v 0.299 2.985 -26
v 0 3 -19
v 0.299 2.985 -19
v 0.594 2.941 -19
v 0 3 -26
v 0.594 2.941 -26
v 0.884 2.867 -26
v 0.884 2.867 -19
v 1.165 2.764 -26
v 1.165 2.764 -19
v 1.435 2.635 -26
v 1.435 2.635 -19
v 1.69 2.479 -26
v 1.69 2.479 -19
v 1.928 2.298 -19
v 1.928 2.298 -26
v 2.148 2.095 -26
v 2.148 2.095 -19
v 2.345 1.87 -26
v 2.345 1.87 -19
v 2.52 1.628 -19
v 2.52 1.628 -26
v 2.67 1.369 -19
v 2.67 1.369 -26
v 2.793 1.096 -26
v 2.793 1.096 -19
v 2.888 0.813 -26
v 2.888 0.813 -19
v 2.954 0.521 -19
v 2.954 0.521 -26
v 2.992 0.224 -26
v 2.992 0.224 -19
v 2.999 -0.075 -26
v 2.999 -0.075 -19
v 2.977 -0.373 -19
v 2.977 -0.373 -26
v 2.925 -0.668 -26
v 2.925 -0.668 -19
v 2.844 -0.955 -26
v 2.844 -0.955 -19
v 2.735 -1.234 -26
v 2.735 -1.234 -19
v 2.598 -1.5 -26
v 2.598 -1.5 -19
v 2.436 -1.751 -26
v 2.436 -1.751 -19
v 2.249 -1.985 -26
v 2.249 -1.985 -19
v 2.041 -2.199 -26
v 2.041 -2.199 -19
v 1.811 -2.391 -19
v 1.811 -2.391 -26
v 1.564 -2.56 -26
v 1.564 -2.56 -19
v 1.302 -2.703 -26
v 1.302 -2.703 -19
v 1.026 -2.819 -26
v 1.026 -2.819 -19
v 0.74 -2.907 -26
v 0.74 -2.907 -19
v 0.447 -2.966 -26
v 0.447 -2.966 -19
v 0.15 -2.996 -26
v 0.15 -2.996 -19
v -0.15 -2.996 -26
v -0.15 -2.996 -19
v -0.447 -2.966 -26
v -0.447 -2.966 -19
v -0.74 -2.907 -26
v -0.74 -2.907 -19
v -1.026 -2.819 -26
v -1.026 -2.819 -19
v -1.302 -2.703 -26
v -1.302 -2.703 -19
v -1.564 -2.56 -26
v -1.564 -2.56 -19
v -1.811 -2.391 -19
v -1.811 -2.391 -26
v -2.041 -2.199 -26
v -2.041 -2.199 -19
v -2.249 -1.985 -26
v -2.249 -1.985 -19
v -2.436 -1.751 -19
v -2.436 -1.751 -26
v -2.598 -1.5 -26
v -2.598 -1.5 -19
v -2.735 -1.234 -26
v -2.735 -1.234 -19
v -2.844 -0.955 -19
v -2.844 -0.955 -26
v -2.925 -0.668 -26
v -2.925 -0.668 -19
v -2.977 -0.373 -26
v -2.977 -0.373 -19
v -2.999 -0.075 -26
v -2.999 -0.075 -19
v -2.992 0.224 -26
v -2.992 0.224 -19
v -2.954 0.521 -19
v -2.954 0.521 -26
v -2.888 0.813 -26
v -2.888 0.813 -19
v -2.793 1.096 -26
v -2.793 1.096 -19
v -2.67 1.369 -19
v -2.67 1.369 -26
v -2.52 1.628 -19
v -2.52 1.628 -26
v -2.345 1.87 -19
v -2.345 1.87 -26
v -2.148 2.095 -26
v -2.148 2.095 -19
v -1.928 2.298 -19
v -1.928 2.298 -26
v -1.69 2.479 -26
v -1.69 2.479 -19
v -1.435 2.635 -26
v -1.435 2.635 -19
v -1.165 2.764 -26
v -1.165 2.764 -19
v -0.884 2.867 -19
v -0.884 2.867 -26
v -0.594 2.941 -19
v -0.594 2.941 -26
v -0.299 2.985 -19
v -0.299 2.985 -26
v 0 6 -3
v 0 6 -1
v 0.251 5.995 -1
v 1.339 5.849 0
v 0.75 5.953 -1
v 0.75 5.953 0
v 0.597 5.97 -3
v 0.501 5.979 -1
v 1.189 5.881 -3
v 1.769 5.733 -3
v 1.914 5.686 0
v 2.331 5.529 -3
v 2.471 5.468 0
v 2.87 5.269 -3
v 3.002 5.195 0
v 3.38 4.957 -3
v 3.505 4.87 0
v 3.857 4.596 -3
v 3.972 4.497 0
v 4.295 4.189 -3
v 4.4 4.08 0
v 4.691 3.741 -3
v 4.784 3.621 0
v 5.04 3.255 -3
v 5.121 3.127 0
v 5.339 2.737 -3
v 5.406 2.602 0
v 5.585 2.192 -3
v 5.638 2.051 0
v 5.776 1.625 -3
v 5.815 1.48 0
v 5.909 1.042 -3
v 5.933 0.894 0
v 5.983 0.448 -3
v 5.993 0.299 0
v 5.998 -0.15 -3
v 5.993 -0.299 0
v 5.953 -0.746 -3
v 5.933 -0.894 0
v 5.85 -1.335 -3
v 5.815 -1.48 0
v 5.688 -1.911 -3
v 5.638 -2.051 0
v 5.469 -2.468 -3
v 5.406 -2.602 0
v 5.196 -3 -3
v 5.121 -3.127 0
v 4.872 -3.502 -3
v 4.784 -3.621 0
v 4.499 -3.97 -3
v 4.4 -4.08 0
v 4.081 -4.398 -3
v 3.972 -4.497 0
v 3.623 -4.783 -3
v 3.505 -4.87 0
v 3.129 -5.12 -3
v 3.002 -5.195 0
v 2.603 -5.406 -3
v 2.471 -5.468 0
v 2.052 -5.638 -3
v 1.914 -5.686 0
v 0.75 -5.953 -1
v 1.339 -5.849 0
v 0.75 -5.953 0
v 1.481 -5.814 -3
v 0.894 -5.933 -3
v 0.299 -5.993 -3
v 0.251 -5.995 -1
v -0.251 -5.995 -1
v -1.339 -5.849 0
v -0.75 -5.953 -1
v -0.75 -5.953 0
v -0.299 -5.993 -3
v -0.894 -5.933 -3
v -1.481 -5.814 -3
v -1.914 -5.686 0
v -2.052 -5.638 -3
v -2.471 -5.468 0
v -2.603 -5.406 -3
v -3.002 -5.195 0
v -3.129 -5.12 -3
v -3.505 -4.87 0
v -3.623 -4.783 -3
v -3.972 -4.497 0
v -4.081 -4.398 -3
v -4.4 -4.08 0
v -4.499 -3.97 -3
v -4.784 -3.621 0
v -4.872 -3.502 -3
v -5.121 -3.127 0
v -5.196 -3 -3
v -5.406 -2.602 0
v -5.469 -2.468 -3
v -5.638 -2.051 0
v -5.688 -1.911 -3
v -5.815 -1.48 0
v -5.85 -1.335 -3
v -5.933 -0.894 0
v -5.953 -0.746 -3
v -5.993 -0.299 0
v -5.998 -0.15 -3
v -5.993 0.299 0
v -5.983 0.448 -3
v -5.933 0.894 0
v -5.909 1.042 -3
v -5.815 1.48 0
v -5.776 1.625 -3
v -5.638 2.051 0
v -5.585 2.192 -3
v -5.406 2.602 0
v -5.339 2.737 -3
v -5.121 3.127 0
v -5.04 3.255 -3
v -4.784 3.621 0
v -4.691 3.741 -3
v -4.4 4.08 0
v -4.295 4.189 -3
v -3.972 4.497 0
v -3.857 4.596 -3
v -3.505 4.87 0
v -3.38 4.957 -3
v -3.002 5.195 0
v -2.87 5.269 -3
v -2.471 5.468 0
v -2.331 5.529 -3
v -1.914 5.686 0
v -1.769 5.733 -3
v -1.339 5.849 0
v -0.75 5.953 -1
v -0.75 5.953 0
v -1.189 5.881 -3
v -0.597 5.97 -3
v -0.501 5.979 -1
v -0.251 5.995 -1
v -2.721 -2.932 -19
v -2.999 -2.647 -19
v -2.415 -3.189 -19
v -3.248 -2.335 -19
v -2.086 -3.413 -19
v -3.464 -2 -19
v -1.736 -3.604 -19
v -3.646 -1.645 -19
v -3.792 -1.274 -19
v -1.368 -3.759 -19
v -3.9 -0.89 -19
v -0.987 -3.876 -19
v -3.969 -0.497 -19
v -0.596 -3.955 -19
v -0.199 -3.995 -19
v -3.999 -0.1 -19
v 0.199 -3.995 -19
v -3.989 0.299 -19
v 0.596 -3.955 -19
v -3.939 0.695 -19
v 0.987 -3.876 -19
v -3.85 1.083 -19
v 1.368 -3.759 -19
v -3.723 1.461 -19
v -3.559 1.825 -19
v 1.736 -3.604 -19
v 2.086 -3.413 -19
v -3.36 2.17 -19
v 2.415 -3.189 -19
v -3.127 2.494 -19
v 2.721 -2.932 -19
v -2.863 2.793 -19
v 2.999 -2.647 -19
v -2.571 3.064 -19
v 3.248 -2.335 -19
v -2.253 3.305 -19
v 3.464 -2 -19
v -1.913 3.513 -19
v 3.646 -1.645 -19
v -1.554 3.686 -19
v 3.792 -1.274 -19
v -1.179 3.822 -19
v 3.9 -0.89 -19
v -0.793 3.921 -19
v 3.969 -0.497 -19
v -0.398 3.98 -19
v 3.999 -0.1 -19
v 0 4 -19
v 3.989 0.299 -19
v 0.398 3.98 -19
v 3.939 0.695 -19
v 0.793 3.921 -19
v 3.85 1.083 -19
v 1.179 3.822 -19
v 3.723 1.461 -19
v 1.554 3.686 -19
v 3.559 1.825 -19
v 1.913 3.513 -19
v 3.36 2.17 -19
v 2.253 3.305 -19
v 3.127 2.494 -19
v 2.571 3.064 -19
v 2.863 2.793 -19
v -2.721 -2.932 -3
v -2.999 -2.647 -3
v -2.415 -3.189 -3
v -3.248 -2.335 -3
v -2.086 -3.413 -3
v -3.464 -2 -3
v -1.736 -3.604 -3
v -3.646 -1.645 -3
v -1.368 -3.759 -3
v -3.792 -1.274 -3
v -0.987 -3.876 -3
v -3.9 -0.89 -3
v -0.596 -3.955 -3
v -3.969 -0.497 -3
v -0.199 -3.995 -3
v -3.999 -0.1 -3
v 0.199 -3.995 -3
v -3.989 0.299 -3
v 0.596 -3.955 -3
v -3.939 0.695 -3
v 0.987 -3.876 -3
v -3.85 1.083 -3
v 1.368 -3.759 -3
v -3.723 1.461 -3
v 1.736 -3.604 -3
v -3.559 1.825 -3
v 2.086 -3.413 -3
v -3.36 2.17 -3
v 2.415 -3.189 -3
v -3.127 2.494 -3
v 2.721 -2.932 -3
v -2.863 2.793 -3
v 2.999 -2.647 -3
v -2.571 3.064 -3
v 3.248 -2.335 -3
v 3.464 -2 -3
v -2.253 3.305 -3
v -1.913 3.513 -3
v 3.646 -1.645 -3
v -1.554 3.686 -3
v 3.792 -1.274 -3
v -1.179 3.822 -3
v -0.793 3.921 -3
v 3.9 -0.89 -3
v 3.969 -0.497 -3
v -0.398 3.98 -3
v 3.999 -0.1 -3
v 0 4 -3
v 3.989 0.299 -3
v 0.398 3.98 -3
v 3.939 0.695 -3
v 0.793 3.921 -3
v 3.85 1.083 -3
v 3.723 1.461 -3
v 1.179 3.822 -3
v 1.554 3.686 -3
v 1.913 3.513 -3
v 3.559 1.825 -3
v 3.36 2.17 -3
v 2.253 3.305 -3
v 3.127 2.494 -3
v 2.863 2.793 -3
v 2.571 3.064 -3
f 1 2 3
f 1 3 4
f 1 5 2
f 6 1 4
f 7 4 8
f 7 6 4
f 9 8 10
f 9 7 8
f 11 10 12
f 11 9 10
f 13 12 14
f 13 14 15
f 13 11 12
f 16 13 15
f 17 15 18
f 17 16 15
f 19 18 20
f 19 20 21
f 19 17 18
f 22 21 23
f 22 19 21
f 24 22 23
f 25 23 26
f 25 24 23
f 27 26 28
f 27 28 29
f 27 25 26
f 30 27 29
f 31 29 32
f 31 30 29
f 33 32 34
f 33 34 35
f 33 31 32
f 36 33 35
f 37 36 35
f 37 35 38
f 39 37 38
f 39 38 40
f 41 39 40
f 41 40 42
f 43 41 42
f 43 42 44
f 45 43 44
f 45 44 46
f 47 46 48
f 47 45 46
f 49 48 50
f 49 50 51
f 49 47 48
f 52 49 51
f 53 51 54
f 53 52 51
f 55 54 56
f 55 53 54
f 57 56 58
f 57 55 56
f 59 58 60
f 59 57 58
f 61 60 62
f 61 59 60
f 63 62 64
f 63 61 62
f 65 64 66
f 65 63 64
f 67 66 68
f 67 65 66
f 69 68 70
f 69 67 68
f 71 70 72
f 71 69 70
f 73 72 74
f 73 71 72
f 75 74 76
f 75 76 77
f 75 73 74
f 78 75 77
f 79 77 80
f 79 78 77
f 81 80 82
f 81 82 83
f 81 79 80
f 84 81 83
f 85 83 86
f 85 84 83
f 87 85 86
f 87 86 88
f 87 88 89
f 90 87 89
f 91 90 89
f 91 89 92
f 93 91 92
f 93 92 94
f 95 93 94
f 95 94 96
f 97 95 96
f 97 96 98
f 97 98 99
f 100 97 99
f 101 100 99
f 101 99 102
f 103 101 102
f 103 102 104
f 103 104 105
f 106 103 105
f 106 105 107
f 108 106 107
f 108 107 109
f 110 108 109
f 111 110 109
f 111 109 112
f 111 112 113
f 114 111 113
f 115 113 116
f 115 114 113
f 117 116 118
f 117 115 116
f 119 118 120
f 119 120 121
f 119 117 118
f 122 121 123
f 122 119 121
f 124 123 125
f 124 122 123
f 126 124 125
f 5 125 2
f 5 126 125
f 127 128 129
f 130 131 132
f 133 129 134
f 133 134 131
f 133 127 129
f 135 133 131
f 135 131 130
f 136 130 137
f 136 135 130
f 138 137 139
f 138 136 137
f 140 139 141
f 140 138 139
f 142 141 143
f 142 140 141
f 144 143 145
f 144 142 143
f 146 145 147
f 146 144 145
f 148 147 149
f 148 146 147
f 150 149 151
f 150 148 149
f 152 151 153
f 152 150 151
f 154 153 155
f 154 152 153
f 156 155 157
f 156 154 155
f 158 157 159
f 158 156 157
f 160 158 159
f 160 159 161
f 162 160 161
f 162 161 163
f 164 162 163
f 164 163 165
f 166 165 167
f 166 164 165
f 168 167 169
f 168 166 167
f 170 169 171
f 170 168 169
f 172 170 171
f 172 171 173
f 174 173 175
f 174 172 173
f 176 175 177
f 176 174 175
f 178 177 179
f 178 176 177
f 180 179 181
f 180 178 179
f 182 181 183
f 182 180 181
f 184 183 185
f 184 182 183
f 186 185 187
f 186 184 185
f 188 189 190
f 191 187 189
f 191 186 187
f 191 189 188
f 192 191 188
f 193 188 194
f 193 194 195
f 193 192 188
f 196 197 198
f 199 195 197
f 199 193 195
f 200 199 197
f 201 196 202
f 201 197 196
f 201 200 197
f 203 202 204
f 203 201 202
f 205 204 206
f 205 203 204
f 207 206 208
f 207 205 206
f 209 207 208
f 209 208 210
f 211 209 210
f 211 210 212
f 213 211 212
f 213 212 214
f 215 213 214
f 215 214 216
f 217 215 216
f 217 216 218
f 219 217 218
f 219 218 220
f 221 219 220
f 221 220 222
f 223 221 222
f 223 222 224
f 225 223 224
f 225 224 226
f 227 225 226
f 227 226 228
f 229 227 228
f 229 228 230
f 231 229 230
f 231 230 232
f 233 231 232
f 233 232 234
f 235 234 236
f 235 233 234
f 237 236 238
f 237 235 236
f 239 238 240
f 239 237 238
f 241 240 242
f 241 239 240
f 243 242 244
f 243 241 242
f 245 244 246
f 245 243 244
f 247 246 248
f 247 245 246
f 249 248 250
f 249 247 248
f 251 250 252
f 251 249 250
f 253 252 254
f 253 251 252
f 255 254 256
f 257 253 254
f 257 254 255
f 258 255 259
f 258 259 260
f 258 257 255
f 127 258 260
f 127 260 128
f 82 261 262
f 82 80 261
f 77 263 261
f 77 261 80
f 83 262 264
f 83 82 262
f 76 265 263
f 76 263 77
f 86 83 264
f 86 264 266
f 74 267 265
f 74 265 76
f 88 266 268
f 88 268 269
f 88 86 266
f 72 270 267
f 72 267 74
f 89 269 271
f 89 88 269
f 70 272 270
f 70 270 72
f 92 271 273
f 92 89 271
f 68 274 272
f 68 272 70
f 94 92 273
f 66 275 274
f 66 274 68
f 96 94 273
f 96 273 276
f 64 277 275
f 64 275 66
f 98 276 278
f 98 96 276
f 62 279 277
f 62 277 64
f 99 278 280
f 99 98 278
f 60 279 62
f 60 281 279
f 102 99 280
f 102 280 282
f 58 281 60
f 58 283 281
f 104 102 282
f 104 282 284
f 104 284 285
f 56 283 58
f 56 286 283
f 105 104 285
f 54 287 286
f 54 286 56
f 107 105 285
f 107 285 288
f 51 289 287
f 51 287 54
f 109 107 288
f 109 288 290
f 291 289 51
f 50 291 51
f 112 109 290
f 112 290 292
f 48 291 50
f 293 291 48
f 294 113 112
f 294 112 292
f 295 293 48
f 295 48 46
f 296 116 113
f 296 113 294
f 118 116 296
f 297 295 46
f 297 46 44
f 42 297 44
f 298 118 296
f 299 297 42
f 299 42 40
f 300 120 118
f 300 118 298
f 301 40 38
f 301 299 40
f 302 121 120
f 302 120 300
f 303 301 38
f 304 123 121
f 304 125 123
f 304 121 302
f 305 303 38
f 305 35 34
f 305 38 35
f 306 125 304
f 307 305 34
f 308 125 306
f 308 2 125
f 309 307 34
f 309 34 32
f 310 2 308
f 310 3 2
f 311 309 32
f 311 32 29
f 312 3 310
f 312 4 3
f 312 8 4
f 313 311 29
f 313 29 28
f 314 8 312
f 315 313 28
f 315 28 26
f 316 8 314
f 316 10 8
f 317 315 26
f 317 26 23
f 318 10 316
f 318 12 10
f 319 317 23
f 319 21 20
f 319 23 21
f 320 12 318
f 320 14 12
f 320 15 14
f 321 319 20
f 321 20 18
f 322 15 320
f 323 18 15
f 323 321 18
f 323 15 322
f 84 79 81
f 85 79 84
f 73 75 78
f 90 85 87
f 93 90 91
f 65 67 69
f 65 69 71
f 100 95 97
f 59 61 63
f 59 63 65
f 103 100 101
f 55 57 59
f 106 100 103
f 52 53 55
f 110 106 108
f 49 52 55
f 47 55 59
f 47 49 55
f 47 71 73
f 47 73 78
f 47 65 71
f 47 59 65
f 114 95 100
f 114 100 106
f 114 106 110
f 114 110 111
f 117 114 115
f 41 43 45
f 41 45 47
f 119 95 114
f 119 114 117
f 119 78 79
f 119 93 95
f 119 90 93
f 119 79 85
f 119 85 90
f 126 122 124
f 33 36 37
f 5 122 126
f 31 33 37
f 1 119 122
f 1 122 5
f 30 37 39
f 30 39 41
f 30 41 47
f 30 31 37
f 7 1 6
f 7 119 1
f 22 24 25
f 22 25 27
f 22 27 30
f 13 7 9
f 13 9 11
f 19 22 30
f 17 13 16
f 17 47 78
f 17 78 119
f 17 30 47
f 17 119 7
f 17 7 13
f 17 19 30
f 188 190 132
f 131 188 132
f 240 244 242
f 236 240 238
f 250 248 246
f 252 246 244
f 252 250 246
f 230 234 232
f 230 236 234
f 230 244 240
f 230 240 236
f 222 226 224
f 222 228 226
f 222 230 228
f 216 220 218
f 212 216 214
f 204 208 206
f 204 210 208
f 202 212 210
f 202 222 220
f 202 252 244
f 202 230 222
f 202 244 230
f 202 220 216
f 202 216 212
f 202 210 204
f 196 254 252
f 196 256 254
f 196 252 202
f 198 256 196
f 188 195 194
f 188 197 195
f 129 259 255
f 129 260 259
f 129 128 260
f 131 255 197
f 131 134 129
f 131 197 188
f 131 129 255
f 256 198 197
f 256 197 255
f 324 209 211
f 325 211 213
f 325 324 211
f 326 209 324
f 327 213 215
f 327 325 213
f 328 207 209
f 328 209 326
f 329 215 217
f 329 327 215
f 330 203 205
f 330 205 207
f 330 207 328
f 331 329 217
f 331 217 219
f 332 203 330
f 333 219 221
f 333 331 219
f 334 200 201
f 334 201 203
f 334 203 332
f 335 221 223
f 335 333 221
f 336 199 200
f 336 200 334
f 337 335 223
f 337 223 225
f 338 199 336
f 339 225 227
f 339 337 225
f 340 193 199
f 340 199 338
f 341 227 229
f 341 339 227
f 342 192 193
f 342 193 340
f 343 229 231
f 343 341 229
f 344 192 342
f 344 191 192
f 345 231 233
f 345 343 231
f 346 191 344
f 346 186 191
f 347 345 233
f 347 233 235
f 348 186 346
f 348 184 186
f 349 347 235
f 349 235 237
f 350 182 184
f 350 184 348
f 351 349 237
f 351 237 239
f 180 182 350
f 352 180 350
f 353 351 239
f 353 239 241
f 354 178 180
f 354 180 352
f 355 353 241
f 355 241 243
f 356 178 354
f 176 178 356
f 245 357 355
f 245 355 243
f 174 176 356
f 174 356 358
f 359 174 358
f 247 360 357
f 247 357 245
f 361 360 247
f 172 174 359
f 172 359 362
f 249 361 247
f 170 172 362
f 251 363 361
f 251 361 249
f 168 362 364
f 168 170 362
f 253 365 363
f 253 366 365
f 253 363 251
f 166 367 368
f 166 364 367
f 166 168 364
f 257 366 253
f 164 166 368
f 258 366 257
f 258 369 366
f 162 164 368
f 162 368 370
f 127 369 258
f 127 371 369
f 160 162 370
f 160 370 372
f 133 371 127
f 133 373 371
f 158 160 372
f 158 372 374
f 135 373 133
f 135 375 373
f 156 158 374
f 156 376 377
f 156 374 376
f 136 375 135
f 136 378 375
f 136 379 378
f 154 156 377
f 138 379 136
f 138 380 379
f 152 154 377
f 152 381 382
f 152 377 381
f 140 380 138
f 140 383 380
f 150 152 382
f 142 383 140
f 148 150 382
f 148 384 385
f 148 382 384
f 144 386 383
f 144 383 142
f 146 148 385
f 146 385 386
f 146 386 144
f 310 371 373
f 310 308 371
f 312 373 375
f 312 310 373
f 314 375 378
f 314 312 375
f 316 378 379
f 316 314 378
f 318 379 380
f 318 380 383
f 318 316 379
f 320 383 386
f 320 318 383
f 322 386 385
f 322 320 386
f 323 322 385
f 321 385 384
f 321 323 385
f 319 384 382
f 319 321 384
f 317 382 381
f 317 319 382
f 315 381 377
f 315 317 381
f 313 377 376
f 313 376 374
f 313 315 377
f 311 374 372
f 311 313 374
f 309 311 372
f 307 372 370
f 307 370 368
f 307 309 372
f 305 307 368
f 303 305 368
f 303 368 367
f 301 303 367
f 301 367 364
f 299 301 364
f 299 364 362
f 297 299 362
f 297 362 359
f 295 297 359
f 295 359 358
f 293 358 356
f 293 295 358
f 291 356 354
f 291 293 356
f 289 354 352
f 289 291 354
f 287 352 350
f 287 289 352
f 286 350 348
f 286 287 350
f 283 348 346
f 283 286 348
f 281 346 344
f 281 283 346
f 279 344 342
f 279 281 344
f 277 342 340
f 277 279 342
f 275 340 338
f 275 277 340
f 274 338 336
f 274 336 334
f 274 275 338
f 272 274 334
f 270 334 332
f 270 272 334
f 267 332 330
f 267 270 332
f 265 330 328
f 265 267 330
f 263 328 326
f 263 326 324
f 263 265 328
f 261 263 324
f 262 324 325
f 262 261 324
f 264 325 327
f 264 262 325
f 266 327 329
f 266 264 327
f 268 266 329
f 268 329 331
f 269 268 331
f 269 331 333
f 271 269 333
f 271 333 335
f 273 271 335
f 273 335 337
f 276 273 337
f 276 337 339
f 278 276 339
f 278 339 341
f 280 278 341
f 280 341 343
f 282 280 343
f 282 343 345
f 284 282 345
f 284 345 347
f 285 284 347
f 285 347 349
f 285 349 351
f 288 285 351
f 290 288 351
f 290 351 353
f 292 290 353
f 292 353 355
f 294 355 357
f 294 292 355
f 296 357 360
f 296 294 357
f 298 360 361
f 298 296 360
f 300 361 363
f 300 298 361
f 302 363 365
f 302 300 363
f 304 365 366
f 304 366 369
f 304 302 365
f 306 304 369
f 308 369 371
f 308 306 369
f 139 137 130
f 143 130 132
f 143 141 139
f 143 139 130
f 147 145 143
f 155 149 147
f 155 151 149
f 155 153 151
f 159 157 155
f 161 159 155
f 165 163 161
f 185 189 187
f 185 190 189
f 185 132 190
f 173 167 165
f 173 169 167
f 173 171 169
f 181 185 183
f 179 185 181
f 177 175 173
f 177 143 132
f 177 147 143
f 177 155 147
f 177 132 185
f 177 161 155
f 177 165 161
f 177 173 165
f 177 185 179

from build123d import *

# Parameters (mm, degrees)
SKETCH_3_W          = 1.5
SKETCH_3_H          = 12
CUT_EXTRUDE_1_DEPTH = 1


with BuildPart() as part:
    # 草图2 → 旋转1 (revolve)
    with BuildSketch(Plane(origin=(0, 0, 0), x_dir=(0, 0, -1), z_dir=(1, 0, 0))):
        Polygon((0, 0), (0, 6), (3, 6), (3, 4), (19, 4), (19, 3), (26, 3), (26, 0), align=None)
    revolve(axis=Axis((0, 0, 0), (0, 0, -1)))

    # 草图3 → 切除-拉伸1 (cut)
    with BuildSketch(Plane.XY):
        Rectangle(SKETCH_3_W, SKETCH_3_H)
    extrude(amount=-CUT_EXTRUDE_1_DEPTH, mode=Mode.SUBTRACT)


solid = part.part
